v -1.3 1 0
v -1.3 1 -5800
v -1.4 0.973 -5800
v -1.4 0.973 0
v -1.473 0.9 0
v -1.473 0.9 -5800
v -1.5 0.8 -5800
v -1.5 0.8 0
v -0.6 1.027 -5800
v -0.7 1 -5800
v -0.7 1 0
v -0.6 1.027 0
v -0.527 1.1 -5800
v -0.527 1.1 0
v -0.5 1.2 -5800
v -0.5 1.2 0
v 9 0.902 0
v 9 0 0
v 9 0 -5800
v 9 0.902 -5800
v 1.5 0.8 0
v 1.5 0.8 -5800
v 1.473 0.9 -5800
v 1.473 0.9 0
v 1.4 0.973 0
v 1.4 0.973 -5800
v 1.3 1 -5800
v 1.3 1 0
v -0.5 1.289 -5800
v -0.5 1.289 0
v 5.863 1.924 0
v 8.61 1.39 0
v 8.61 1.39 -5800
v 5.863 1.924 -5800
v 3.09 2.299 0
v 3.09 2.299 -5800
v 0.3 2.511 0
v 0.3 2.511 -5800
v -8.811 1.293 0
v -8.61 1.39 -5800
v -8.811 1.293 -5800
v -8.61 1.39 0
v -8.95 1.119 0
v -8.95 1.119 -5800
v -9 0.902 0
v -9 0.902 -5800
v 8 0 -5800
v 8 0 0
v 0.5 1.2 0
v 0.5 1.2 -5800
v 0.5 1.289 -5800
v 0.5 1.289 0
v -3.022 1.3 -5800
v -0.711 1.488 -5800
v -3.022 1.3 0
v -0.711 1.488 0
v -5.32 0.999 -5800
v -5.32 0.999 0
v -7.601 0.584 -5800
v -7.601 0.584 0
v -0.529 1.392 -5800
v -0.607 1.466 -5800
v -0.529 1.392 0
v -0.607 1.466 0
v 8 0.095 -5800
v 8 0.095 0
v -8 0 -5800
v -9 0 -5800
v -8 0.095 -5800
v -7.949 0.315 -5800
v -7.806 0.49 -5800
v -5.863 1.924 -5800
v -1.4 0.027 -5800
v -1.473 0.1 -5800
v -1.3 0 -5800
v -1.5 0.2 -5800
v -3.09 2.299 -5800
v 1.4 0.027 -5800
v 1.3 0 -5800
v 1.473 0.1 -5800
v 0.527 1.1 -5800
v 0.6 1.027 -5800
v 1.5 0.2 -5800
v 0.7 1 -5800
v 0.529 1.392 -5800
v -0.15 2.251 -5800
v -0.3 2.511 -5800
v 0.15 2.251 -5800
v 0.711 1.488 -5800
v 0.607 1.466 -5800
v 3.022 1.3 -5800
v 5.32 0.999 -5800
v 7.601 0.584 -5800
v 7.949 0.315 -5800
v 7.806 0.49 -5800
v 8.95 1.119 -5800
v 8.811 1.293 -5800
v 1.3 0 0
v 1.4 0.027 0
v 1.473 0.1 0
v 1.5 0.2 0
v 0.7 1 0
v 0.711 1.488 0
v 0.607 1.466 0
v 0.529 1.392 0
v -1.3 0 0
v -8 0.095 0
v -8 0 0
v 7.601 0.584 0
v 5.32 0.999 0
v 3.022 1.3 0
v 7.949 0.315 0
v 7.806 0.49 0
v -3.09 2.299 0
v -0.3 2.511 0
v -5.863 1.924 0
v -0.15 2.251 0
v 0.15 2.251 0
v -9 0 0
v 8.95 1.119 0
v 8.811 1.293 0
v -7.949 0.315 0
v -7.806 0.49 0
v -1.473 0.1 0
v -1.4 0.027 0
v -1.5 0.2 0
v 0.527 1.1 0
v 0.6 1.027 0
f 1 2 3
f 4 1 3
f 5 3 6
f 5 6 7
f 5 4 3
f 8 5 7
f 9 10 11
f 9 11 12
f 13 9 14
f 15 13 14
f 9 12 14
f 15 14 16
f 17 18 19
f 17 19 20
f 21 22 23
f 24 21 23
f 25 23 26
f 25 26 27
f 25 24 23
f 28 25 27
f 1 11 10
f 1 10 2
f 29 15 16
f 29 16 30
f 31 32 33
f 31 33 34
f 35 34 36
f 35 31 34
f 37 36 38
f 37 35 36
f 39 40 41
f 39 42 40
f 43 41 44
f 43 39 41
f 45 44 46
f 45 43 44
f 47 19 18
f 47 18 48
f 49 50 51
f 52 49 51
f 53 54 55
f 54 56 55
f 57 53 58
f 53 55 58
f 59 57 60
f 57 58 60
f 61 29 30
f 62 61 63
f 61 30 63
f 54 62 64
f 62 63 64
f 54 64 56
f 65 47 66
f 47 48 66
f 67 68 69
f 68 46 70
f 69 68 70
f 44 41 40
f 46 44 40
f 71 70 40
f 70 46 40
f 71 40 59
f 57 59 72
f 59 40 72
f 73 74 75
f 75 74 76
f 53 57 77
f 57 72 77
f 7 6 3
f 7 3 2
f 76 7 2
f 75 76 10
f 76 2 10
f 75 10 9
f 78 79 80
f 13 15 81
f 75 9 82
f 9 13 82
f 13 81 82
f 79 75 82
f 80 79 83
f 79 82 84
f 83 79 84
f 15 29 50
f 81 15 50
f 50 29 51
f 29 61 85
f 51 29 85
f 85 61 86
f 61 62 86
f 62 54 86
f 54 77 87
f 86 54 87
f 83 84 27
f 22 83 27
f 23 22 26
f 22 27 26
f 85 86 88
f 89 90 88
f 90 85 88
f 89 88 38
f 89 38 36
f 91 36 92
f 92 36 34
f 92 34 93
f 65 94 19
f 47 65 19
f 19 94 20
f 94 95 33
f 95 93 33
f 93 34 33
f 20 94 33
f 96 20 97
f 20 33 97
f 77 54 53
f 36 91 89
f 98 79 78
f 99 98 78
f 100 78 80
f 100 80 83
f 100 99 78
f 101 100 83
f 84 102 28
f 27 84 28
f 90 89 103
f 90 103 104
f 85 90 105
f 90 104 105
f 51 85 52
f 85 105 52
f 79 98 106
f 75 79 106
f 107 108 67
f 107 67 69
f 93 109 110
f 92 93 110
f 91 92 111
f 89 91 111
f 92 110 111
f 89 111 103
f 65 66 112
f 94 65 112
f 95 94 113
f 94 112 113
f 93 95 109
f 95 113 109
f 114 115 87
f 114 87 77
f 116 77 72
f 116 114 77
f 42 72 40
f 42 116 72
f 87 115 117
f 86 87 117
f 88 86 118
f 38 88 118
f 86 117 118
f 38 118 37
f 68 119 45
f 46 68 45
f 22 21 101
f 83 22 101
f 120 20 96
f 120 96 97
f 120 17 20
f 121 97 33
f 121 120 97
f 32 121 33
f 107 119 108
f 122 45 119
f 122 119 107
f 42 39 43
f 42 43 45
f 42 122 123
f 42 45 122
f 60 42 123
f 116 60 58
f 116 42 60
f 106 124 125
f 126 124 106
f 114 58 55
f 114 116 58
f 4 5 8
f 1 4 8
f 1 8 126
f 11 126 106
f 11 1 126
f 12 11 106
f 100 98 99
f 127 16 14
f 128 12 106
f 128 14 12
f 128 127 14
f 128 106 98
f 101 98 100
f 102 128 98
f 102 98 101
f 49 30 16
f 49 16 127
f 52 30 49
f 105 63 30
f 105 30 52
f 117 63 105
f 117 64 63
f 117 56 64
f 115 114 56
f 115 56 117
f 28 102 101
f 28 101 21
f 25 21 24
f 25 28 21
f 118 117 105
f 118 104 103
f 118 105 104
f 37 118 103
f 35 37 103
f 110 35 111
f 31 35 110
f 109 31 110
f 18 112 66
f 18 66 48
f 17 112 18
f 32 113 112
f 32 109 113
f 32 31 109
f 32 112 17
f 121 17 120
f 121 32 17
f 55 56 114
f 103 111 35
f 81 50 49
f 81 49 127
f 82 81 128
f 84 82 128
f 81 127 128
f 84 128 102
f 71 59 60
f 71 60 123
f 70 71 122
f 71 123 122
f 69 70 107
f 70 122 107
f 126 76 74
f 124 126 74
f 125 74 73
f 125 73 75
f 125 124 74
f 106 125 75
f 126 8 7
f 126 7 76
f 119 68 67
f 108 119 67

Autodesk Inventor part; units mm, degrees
ref_plane "YZ Plane" through (0, 0, 0) normal (1, 0, 0) x (0, 1, 0)
ref_plane "XZ Plane" through (0, 0, 0) normal (0, 1, 0) x (-1, 0, 0)
ref_plane "XY Plane" through (0, 0, 0) normal (0, 0, 1) x (1, 0, 0)
sketch "Boceto1" plane through (0, 0, 0) normal (0, 0, 1) x (1, 0, 0)
  line L0 (0, -2.926) -> (0, 4.2457) construction
  line L1 (-0.5, 1.2) -> (-0.5, 1.2888)
  line L2 (-0.7, 1) -> (-1.3, 1)
  line L3 (-1.5, 0.8) -> (-1.5, 0.2)
  line L4 (-9, 0) -> (-8, 0)
  line L5 (-8, 0) -> (-8, 0.0947)
  line L6 (-9, 0) -> (-9, 0.9017)
  arc A0 (-0.3, 2.5112) -> (-8.6098, 1.3895) centre (1.9614, -45.5856) ccw
  arc A1 (-0.7113, 1.4885) -> (-7.6014, 0.5844) centre (1.9614, -45.5856) ccw
  line L7 (0.5, 1.2) -> (0.5, 1.2888)
  line L8 (0.7, 1) -> (1.3, 1)
  line L9 (1.5, 0.8) -> (1.5, 0.2)
  line L10 (9, 0) -> (8, 0)
  line L11 (8, 0) -> (8, 0.0947)
  line L12 (9, 0) -> (9, 0.9017)
  arc A2 (8.6098, 1.3895) -> (0.3, 2.5112) centre (-1.9614, -45.5856) ccw
  arc A3 (7.6014, 0.5844) -> (0.7113, 1.4885) centre (-1.9614, -45.5856) ccw
  line L13 (1.3, 0) -> (-1.3, 0)
  arc A4 (-0.3, 2.5112) -> (0.3, 2.5112) centre (0, 2.5112) ccw
  arc A5 (-8.6098, 1.3895) -> (-9, 0.9017) centre (-8.5, 0.9017) ccw
  arc A6 (-7.6014, 0.5844) -> (-8, 0.0947) centre (-7.5, 0.0947) ccw
  arc A7 (8, 0.0947) -> (7.6014, 0.5844) centre (7.5, 0.0947) ccw
  arc A8 (9, 0.9017) -> (8.6098, 1.3895) centre (8.5, 0.9017) ccw
  arc A9 (-0.7, 1) -> (-0.5, 1.2) centre (-0.7, 1.2) ccw
  arc A10 (-0.5, 1.2888) -> (-0.7113, 1.4885) centre (-0.7, 1.2888) ccw
  arc A11 (0.7113, 1.4885) -> (0.5, 1.2888) centre (0.7, 1.2888) ccw
  arc A12 (0.5, 1.2) -> (0.7, 1) centre (0.7, 1.2) ccw
  arc A13 (1.5, 0.8) -> (1.3, 1) centre (1.3, 0.8) ccw
  arc A14 (1.3, 0) -> (1.5, 0.2) centre (1.3, 0.2) ccw
  arc A15 (-1.5, 0.2) -> (-1.3, 0) centre (-1.3, 0.2) ccw
  arc A16 (-1.3, 1) -> (-1.5, 0.8) centre (-1.3, 0.8) ccw
  line L14 (-1.0156, 2.5112) -> (0.9053, 2.5112) construction
  point P0 (0, 0)
  point P1 (-0.5, 1)
  point P2 (-1.5, 1)
  point P3 (-1.5, 0)
  point P4 (-8, 0.5)
  point P5 (-9, 1.3)
  point P6 (-0.5, 1.5)
  point P7 (8, 0.5)
  point P8 (9, 1.3)
  point P9 (0.5, 1.5)
  dimension "d21" = 1
  dimension "d26" = 0.5
  dimension "d31" = 1
  dimension "d34" = 0.5
  dimension "d35" = 1.3
  dimension "d37" = 1
  dimension "d38" = 0.5
  dimension "d39" = 9
  dimension "d41" = 1
  dimension "d42" = 3
  dimension "d43" = 1.5
  dimension "d44" = 1.5
  dimension "d45" = 1
  dimension "d46" = 1.3
  dimension "d47" = 0.5
  dimension "d48" = 1
  dimension "d49" = 18
  dimension "d56" = 0.6
  dimension "d63" = 0.5
  dimension "d64" = 0.2
  dimension "d66" = 2.5112
extrude "Extrusión1" add sketch "Boceto1" against normal blind 5800
properties part number "SP40-14 PERFIL RETICULAR TRAVESAÑO" material "Aluminio"
